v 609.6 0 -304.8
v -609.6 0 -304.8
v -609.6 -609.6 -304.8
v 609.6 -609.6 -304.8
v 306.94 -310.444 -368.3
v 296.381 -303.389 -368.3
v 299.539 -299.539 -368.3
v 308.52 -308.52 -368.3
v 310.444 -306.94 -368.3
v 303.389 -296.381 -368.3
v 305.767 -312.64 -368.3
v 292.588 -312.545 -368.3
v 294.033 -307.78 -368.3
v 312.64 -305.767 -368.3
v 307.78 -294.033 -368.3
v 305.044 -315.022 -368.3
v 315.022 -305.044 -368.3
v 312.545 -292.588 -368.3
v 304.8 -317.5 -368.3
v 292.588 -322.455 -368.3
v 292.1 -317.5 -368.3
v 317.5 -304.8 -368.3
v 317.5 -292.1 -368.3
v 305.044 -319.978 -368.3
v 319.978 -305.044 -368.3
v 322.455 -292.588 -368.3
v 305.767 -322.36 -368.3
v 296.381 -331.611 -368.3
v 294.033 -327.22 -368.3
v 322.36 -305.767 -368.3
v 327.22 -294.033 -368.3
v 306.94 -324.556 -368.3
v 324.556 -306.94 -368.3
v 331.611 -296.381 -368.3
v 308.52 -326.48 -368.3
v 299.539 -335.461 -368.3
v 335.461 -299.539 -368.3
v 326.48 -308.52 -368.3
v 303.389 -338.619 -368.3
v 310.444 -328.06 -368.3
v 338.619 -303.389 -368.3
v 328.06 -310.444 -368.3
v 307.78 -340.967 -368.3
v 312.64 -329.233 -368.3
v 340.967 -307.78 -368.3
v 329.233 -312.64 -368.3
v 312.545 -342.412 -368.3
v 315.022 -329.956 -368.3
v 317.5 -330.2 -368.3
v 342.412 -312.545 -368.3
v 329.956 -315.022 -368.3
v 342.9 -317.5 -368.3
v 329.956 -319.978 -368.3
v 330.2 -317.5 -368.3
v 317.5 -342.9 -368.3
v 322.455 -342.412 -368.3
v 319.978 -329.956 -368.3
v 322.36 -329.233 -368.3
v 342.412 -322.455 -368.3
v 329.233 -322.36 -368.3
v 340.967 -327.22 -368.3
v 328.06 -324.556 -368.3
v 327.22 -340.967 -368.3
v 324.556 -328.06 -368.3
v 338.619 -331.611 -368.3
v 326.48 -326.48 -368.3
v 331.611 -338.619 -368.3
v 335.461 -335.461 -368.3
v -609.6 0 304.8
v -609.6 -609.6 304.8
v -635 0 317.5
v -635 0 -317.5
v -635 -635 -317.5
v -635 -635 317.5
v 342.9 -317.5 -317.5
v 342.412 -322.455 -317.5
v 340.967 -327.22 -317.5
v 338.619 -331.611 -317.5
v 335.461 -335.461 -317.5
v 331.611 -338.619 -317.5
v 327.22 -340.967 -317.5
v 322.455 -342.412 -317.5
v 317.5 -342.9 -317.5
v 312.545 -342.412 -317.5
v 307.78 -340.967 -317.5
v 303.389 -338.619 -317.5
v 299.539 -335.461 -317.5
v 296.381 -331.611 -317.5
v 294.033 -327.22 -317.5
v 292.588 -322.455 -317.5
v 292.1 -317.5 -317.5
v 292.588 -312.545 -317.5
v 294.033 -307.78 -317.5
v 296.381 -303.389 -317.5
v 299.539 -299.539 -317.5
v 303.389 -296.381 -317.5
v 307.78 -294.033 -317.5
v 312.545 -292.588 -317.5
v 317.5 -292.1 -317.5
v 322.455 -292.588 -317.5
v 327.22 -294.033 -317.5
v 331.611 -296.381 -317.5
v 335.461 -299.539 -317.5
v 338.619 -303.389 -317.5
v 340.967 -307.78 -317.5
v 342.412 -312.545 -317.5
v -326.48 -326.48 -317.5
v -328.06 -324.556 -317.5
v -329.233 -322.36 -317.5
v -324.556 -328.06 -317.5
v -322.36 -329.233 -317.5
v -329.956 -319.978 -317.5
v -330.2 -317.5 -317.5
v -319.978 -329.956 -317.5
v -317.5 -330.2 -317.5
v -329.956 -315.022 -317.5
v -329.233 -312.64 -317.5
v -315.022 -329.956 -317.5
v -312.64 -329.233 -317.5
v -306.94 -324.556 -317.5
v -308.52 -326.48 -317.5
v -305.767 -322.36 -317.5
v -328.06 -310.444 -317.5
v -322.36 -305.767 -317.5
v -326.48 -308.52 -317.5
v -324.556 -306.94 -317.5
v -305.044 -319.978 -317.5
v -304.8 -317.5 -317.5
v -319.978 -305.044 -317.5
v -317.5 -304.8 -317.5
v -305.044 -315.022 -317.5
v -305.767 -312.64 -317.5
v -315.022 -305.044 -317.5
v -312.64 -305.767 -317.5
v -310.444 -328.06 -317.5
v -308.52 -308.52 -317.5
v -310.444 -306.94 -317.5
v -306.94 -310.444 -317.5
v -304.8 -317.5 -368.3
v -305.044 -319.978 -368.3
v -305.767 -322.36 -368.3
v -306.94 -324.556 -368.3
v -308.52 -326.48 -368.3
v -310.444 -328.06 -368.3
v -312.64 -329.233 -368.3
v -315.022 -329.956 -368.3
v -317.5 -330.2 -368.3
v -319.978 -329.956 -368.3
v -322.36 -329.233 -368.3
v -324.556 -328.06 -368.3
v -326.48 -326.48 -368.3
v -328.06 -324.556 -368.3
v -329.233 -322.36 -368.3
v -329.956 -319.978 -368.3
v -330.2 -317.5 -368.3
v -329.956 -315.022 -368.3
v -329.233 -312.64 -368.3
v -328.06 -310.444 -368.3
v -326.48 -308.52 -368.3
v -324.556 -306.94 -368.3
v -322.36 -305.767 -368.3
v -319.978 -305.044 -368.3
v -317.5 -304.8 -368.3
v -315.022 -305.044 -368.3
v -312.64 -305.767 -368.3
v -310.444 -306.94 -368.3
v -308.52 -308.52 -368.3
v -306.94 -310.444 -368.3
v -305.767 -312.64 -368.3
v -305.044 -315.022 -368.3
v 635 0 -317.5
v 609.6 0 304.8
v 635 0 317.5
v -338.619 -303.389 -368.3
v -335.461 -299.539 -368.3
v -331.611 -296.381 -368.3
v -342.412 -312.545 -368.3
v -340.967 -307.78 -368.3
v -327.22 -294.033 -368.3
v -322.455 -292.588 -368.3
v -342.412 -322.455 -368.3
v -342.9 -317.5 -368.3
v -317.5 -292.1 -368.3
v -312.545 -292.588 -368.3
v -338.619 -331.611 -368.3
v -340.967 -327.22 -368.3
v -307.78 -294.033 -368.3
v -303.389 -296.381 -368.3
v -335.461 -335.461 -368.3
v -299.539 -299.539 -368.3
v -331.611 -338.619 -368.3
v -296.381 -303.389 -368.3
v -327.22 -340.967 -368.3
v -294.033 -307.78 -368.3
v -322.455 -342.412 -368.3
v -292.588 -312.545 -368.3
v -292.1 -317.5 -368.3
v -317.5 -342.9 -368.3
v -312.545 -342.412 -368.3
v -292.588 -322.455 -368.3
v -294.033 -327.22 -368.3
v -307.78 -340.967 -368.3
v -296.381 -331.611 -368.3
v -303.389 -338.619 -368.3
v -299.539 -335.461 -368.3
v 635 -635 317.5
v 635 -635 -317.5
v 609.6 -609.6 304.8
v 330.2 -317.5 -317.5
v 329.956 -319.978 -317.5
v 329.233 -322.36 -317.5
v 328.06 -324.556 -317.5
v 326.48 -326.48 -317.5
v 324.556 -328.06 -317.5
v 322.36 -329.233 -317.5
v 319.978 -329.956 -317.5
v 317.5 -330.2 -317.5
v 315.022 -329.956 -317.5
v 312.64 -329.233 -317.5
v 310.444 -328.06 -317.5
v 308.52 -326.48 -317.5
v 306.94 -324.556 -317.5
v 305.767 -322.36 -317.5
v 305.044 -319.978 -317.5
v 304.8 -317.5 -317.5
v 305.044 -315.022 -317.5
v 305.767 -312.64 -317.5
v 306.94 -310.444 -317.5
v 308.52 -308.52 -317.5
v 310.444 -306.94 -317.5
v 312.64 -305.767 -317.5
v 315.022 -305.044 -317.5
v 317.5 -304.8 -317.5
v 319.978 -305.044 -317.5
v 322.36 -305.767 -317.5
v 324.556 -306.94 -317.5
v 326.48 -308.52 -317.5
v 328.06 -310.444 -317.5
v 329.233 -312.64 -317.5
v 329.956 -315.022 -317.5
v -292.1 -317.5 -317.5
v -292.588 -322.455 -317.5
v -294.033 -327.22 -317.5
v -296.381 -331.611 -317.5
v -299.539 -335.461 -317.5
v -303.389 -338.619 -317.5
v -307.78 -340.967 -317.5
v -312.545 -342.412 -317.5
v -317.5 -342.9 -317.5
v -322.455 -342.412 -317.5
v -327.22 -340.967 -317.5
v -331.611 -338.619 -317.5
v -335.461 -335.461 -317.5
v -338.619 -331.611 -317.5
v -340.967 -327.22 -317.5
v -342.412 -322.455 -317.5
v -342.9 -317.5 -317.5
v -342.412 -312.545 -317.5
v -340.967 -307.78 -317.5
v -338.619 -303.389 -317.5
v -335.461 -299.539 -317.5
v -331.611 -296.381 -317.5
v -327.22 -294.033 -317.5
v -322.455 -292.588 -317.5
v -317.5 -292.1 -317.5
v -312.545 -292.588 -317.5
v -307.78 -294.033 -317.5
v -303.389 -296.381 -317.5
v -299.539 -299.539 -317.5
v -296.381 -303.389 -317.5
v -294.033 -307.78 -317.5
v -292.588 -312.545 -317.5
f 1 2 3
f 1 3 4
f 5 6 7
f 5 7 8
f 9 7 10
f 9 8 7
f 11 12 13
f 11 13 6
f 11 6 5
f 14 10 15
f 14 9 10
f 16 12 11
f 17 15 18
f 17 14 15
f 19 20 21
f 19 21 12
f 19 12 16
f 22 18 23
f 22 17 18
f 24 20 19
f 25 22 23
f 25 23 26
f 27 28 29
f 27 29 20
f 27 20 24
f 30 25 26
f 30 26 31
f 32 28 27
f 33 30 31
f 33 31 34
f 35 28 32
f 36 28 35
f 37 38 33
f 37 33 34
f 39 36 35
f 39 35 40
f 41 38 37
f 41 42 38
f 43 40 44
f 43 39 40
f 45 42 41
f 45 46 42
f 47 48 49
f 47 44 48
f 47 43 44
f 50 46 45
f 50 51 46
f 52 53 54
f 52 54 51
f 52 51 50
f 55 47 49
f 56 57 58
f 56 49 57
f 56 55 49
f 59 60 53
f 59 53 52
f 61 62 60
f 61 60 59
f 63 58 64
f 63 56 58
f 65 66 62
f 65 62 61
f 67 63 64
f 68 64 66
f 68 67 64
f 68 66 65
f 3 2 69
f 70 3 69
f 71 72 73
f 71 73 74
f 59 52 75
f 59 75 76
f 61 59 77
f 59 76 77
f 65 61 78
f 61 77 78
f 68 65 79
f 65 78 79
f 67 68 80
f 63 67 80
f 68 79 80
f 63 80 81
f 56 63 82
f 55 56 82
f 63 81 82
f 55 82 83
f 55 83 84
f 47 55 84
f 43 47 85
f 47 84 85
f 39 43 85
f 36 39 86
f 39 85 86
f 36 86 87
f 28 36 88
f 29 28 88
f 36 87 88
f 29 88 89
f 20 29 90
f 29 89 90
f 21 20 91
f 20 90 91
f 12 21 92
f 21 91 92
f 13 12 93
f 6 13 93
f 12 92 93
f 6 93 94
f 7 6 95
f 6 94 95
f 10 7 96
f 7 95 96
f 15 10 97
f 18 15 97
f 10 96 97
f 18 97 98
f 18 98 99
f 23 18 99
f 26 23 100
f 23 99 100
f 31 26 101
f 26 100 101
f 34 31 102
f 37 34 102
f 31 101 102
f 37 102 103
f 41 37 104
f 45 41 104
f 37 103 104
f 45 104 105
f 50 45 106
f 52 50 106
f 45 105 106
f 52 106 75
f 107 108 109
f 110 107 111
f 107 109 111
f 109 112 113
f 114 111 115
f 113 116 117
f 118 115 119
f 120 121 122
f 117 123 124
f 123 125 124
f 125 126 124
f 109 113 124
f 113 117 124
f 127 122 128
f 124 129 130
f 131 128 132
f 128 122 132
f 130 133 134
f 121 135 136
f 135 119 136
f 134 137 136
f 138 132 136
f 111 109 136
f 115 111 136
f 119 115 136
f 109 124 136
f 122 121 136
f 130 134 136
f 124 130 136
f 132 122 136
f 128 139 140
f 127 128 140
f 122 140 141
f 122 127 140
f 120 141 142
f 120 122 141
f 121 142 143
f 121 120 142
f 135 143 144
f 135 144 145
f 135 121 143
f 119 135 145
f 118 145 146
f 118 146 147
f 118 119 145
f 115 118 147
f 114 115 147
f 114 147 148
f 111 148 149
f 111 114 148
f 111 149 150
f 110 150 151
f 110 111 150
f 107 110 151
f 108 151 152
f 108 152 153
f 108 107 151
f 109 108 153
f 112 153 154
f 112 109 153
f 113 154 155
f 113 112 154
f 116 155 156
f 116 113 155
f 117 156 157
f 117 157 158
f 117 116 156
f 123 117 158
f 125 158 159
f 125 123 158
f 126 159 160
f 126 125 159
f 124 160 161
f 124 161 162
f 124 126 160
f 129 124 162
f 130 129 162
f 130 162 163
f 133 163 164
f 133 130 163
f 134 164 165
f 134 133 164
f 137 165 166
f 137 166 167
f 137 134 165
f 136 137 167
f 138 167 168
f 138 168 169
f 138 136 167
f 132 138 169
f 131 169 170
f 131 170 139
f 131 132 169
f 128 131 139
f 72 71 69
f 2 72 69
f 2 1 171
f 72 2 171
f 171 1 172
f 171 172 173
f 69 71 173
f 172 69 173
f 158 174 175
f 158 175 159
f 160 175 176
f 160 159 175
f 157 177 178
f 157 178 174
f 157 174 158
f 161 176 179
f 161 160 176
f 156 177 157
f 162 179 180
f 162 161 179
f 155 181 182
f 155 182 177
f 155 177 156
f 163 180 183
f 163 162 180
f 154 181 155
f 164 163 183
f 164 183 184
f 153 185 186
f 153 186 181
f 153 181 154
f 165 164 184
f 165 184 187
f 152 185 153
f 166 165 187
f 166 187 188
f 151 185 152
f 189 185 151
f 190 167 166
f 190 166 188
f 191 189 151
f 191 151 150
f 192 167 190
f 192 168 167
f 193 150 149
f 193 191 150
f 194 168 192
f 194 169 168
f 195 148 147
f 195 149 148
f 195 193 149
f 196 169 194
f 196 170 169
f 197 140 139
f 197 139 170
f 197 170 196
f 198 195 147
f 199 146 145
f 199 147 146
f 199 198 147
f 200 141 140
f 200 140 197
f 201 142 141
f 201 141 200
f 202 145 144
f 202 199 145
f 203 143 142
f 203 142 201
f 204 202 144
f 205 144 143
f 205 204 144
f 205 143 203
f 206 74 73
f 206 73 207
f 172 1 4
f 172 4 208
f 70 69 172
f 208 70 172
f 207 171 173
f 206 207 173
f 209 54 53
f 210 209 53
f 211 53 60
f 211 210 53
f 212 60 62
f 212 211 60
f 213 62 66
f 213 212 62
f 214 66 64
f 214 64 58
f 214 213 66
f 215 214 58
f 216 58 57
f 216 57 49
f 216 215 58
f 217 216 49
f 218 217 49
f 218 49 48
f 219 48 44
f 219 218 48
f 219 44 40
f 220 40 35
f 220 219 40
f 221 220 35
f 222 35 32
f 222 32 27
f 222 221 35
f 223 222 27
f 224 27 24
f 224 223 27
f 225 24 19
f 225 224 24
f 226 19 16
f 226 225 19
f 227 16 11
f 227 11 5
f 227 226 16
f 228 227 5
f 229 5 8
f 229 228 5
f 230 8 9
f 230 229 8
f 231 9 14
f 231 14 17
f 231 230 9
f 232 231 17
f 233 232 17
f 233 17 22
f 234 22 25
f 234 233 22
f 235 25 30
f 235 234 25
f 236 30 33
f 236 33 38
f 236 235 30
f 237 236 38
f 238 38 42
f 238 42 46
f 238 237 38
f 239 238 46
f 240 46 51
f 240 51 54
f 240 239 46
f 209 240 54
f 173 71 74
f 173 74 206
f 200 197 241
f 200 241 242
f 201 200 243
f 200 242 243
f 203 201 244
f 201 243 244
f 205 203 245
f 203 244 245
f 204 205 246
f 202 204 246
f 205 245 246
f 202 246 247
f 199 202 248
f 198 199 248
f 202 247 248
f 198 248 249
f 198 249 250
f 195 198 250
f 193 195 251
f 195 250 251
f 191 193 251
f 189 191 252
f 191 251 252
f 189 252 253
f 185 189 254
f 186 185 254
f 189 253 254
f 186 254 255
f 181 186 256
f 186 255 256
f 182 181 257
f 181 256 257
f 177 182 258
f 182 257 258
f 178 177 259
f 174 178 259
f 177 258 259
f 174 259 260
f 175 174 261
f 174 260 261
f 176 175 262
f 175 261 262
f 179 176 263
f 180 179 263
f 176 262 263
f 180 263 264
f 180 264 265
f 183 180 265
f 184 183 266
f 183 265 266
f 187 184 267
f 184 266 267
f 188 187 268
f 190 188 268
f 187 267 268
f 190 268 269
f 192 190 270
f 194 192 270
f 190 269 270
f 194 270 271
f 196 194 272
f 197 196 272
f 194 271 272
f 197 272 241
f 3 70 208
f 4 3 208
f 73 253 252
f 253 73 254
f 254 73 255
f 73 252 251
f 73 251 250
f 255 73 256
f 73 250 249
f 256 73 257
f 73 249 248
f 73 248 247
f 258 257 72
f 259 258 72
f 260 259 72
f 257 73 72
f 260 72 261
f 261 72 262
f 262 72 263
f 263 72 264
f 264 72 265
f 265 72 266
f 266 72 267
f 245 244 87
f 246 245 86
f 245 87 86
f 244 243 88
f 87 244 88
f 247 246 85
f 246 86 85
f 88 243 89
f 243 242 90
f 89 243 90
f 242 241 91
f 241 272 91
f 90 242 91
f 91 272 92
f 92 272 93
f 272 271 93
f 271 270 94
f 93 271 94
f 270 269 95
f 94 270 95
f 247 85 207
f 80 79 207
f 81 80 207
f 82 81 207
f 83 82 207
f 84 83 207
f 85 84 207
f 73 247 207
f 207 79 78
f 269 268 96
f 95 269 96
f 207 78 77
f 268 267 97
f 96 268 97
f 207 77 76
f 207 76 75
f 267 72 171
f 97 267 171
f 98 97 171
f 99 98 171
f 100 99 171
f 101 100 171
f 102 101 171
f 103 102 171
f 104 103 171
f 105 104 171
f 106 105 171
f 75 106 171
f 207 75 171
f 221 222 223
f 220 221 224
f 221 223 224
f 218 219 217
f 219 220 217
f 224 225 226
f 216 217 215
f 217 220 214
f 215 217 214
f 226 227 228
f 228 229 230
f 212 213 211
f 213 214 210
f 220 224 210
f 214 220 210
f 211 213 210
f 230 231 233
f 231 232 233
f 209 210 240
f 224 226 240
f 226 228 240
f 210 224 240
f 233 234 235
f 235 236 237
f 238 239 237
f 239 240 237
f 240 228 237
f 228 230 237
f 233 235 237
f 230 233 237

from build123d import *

# Parameters (mm, degrees)
F0_W     = 1270
F0_H     = 635
F0_W_2   = 1219.2
F0_H_2   = 609.6
F1_DEPTH = 635
F2_DEPTH = 609.6
F3_R     = 25.4
F3_R_2   = 12.7
F4_DEPTH = 50.8


with BuildPart() as f1:
    # F0 (on Front) → F1 (new body)
    with BuildSketch(Plane.XZ):
        Rectangle(F0_W, F0_H)
        Rectangle(F0_W_2, F0_H_2, mode=Mode.SUBTRACT)
        Rectangle(F0_W_2, F0_H_2)
    extrude(amount=F1_DEPTH)

    # F0 (on Front) → F2 (cut)
    with BuildSketch(Plane.XZ):
        Rectangle(F0_W_2, F0_H_2)
    extrude(amount=F2_DEPTH, mode=Mode.SUBTRACT)

    # F3 (on face) → F4 (join)
    with BuildSketch(Plane(origin=(0, 0, -317.5), x_dir=(1, 0, 0), z_dir=(0, 0, -1))):
        with Locations((317.5, 317.5)):
            Circle(F3_R)
        with Locations((317.5, 317.5)):
            Circle(F3_R_2, mode=Mode.SUBTRACT)
        with Locations((-317.5, 317.5)):
            Circle(F3_R)
        with Locations((-317.5, 317.5)):
            Circle(F3_R_2, mode=Mode.SUBTRACT)
    extrude(amount=F4_DEPTH)


solid = f1.part
